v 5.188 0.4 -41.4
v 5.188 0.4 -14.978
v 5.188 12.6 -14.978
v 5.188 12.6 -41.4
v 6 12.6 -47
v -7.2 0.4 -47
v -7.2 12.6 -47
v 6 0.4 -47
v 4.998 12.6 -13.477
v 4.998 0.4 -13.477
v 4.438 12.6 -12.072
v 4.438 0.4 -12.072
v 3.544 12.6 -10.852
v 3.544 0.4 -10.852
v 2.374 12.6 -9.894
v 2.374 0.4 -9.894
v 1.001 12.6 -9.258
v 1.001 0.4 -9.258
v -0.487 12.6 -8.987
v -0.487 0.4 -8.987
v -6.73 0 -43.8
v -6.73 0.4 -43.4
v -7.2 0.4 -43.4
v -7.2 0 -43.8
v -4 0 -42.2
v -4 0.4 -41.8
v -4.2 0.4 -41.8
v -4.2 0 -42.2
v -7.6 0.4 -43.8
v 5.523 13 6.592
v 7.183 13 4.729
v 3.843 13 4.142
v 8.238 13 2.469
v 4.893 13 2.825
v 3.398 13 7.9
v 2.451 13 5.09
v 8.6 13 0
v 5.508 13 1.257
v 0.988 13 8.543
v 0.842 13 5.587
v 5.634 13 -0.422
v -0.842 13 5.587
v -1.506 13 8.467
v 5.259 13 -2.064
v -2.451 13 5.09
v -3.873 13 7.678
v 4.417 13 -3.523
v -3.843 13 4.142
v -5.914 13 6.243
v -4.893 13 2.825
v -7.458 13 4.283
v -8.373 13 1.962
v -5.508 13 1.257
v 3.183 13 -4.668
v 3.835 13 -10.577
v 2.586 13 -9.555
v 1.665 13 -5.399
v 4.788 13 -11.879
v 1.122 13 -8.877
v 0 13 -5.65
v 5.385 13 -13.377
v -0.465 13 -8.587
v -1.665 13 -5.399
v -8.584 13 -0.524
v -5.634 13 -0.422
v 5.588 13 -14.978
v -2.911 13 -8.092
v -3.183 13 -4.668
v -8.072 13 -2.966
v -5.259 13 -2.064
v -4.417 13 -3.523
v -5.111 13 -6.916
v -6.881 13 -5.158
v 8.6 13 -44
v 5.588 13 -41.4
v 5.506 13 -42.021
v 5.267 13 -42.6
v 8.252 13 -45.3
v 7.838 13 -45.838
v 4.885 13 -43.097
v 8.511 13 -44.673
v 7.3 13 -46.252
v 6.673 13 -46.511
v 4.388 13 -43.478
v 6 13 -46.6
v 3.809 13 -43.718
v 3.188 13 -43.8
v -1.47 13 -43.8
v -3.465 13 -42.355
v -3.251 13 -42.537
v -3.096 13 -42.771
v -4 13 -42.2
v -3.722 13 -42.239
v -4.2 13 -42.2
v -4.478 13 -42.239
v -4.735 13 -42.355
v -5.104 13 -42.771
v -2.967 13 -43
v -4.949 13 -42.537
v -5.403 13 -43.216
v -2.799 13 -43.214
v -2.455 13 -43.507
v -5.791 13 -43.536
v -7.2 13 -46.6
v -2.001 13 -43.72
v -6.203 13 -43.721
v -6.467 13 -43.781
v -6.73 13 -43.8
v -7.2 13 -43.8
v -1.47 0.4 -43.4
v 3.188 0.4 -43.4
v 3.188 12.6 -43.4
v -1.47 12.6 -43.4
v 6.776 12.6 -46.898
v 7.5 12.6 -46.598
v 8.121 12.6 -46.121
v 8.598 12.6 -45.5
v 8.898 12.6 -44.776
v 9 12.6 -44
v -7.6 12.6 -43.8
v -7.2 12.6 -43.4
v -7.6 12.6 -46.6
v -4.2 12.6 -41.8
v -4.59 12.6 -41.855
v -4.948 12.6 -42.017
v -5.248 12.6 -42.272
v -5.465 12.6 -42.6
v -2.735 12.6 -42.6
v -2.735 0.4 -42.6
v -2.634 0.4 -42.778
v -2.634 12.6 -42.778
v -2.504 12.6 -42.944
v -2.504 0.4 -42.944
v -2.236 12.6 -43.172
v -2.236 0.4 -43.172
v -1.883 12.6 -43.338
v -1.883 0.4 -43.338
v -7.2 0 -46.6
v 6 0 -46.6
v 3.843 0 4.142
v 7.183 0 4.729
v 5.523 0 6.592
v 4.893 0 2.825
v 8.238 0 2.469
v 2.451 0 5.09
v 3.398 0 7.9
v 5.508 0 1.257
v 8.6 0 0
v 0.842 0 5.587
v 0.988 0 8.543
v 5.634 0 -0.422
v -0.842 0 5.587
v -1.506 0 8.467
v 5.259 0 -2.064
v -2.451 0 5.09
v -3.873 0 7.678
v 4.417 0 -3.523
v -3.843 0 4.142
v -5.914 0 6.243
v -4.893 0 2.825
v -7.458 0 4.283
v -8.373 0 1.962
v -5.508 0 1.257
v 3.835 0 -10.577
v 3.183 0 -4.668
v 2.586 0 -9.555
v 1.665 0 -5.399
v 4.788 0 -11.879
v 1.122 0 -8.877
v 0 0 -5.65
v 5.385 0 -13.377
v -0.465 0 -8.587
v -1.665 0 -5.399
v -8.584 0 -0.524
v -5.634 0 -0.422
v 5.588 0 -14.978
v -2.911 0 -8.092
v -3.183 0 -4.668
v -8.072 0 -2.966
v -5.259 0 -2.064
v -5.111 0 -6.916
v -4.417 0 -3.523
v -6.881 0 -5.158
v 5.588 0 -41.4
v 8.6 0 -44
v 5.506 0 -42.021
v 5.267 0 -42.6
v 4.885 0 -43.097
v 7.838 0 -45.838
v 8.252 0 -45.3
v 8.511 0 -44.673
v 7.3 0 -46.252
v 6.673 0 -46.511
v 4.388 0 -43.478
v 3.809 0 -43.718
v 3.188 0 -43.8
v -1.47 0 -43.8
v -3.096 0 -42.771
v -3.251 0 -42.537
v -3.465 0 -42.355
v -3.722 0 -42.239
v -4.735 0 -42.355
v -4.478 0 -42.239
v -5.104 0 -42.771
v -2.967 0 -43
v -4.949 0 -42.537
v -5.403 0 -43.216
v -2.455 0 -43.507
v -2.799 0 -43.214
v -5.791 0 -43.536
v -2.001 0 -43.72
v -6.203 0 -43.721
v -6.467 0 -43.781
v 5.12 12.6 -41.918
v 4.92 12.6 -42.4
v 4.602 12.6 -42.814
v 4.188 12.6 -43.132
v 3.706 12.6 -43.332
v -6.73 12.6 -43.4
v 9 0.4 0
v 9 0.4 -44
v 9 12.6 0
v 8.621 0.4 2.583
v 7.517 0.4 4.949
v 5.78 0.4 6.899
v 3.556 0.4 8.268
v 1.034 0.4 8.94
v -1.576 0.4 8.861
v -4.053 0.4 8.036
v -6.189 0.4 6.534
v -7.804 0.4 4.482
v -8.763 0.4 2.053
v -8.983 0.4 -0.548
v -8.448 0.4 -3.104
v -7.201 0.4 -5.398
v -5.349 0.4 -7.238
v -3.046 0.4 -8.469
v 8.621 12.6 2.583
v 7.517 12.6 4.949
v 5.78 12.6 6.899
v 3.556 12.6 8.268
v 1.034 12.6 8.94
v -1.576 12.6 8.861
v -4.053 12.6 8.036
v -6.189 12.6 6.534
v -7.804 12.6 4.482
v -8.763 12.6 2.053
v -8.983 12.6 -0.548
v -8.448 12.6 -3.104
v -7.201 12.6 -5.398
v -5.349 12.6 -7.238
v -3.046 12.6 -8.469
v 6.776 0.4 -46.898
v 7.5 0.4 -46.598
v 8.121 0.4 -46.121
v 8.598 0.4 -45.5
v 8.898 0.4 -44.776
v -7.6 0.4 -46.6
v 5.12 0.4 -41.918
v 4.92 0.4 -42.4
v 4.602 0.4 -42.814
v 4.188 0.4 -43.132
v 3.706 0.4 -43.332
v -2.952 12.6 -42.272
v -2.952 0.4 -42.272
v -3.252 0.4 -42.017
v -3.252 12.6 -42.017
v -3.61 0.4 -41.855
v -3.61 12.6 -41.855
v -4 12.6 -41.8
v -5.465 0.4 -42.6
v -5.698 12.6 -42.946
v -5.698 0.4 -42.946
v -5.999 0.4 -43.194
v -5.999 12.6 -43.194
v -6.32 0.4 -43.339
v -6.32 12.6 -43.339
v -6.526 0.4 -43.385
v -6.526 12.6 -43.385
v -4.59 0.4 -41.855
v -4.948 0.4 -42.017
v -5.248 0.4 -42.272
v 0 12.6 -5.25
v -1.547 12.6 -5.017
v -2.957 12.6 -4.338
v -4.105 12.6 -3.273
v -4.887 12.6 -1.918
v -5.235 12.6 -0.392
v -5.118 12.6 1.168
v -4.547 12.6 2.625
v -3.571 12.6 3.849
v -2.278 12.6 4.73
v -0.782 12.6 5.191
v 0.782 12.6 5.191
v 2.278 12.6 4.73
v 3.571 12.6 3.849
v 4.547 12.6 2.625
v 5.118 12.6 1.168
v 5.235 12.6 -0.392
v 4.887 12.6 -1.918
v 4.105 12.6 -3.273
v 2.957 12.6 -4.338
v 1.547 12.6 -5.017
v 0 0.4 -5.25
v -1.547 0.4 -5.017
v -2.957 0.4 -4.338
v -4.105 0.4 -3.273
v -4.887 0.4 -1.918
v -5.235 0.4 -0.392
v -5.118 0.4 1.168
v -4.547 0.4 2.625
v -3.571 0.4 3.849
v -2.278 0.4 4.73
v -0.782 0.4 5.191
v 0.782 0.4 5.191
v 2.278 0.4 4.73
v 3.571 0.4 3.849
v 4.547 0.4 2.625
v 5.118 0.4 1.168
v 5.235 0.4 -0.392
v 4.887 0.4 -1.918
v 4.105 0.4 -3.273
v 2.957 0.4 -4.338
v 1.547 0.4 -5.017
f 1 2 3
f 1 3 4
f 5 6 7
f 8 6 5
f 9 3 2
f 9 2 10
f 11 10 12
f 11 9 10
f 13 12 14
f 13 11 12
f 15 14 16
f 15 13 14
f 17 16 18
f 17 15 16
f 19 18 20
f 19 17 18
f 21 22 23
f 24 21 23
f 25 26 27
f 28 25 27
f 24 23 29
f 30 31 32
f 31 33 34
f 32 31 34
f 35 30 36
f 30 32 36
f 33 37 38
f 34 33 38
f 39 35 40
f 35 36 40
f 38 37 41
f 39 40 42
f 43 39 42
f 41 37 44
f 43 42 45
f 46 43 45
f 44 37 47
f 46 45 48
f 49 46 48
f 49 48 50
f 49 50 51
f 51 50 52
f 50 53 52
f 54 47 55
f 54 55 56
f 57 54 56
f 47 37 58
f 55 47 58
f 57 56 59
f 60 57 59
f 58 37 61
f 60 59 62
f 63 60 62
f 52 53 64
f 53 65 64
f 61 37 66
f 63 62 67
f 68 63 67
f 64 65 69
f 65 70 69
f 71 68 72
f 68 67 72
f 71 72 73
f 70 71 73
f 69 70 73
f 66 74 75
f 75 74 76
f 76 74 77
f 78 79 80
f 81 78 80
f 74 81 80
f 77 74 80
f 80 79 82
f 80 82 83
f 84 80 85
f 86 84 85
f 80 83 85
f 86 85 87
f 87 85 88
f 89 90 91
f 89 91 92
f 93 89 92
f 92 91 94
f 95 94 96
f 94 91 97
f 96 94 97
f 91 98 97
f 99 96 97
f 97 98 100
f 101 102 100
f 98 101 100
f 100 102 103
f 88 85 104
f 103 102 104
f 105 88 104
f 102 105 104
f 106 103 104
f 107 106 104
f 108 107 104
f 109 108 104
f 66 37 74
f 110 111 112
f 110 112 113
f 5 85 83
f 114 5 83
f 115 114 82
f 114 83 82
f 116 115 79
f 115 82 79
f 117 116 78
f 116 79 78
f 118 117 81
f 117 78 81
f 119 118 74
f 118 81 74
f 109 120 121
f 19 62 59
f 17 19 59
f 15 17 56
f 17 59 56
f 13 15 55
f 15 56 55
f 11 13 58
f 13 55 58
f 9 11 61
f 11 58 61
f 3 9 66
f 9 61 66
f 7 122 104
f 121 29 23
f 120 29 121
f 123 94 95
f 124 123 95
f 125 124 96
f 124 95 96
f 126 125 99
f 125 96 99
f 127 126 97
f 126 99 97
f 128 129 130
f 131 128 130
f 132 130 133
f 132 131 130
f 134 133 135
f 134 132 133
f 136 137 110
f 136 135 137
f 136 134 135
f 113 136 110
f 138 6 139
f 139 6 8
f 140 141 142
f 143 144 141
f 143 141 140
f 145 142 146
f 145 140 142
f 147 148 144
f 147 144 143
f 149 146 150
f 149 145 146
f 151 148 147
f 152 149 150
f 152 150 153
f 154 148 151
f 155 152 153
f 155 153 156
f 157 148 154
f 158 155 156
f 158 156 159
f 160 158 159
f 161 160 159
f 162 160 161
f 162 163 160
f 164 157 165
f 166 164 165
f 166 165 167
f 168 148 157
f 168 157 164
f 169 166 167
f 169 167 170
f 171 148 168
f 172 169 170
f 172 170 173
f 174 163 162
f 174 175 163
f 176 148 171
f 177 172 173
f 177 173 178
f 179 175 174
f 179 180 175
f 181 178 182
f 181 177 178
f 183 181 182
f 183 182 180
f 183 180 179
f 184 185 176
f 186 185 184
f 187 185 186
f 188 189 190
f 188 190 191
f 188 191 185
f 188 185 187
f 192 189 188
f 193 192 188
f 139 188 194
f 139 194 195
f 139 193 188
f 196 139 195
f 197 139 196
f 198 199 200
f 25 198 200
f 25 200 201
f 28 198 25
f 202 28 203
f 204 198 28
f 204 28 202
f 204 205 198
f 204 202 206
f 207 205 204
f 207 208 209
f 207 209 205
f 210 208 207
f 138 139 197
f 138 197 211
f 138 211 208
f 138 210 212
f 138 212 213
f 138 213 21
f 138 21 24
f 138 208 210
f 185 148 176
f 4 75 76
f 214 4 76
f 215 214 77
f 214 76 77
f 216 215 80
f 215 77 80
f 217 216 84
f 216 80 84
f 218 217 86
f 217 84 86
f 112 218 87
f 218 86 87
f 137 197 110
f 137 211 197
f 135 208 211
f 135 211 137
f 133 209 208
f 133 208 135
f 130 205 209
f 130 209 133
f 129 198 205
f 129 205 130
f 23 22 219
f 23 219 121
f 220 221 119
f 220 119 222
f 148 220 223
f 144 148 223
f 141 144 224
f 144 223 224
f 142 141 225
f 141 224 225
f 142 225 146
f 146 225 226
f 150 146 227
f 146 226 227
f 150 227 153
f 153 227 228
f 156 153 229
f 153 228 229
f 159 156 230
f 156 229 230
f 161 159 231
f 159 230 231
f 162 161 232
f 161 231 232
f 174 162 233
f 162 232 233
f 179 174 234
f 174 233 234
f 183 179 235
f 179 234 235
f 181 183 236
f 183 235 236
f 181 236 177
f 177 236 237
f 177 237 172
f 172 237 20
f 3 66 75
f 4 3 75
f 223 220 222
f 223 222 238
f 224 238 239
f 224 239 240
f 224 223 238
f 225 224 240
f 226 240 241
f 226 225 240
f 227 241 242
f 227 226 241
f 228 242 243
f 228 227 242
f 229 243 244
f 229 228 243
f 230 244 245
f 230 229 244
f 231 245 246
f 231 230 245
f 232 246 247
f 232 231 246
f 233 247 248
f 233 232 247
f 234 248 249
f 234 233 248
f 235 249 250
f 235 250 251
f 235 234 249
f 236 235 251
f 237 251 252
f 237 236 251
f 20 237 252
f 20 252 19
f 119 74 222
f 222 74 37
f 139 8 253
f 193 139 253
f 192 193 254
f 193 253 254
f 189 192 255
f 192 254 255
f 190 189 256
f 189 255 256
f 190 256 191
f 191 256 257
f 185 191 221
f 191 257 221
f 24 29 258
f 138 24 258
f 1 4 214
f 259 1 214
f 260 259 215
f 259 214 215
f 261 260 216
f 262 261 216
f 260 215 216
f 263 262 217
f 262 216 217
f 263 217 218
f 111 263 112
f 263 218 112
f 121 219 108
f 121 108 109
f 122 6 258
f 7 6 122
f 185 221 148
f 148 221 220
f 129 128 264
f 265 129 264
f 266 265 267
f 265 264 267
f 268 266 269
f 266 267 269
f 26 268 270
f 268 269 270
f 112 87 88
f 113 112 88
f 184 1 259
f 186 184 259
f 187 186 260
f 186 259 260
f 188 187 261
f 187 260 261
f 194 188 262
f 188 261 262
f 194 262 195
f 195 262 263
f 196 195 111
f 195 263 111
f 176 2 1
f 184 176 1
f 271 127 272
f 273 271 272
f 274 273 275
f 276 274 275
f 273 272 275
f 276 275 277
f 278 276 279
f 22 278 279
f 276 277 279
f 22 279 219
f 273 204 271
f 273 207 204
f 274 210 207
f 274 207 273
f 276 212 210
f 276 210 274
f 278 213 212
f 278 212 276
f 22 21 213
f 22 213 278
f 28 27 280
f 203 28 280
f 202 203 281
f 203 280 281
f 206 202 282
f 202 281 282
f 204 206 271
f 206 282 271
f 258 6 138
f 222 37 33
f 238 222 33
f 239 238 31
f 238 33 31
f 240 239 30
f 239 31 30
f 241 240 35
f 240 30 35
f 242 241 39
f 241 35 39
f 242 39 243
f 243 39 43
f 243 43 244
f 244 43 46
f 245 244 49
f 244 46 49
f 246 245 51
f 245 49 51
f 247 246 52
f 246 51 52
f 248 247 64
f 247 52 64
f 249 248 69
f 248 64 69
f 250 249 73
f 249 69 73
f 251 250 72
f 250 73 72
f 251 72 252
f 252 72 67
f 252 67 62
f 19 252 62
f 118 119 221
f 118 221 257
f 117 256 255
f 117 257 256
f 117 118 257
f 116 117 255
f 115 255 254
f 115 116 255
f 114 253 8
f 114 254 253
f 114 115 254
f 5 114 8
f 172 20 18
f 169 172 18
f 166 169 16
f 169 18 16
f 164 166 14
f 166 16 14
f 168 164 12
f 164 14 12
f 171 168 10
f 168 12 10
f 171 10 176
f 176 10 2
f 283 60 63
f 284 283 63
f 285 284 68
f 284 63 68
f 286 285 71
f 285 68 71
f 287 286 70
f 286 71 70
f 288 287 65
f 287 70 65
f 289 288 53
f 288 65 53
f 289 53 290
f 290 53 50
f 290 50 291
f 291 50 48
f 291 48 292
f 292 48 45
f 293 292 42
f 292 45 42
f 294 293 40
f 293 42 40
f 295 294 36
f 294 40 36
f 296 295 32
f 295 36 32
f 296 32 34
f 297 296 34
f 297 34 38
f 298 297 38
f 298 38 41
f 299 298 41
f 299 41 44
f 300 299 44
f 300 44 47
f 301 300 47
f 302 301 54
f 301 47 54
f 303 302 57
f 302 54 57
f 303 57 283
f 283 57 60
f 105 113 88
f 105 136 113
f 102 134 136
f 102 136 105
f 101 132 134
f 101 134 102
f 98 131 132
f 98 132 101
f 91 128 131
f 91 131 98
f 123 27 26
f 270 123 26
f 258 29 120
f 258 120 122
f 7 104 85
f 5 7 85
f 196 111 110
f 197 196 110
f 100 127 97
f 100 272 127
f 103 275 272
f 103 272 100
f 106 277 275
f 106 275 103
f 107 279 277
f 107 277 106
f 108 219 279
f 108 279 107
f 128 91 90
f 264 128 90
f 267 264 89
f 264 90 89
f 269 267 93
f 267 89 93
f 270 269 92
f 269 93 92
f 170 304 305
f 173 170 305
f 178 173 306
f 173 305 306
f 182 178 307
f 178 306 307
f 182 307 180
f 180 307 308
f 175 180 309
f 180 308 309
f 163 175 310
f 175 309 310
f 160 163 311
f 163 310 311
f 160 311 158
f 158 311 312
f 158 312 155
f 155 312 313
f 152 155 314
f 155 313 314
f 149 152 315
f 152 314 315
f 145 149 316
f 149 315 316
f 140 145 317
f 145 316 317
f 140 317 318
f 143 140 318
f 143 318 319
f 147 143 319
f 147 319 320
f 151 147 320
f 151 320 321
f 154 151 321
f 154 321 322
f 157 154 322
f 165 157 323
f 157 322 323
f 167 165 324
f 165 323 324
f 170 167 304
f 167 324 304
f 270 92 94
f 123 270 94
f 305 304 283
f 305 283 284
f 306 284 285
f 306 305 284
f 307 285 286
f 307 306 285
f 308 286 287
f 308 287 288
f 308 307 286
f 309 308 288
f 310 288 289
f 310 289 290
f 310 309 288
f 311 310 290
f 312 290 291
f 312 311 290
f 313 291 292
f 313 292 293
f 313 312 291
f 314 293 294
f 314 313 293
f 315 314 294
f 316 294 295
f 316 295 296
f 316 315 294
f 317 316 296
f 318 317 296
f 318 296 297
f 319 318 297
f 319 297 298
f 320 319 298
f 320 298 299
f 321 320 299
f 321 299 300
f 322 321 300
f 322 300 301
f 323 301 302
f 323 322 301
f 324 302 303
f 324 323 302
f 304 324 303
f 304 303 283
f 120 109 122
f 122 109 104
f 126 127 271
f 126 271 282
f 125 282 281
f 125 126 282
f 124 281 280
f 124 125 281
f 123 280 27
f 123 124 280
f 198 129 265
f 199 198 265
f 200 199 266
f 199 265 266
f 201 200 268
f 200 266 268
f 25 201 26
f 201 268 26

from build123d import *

# Parameters (mm, degrees)
SKETCH_1_R      = 5.25
EXTRUDE_1_DEPTH = 13
FILLET_1_R      = 6
FILLET_2_R      = 2
FILLET_3_R      = 3
SKETCH_2_W      = 3
SKETCH_2_H      = 13
EXTRUDE_2_DEPTH = 1.6
FILLET_4_R      = 1.4
FILLET_5_R      = 1.4
CHAMFER_1_SIZE  = 0.4


with BuildPart() as part:
    # 草图1 → 凸台-拉伸1 (new body)
    with BuildSketch(Plane(origin=(0, 0, 0), x_dir=(1, 0, 0), z_dir=(0, 1, 0))):
        with BuildLine():
            Line((5.188235294, 7.354061091), (5.188235294, 43.4))
            Line((5.188235294, 43.4), (-7.6, 43.4))
            Line((-7.6, 43.4), (-7.6, 47))
            Line((-7.6, 47), (5.4, 47))
            Line((5.4, 47), (9, 47))
            Line((9, 47), (9, 0))
            ThreePointArc((9, 0), (-7.990435459, -4.14161094), (5.188235294, 7.354061091))
        make_face()
        with Locations(Location((0, 0, 0), (0, 0, 90))):
            Circle(SKETCH_1_R, mode=Mode.SUBTRACT)
    extrude(amount=EXTRUDE_1_DEPTH)

    # 圆角1
    fillet_1_edges = [part.edges().sort_by_distance(p)[0] for p in [
        (5.188235294, 6.5, -7.354061091),
    ]]
    fillet(fillet_1_edges, radius=FILLET_1_R)

    # 圆角2
    fillet_2_edges = [part.edges().sort_by_distance(p)[0] for p in [
        (5.188235294, 6.5, -43.4),
    ]]
    fillet(fillet_2_edges, radius=FILLET_2_R)

    # 圆角3
    fillet_3_edges = [part.edges().sort_by_distance(p)[0] for p in [
        (9, 6.5, -47),
    ]]
    fillet(fillet_3_edges, radius=FILLET_3_R)

    # 草图2 → 凸台-拉伸2 (add)
    with BuildSketch(Plane.XY.offset(-43.4)):
        with Locations((-4.1, 6.5)):
            Rectangle(SKETCH_2_W, SKETCH_2_H)
    extrude(amount=EXTRUDE_2_DEPTH)

    # 圆角4
    fillet_4_edges = [part.edges().sort_by_distance(p)[0] for p in [
        (-5.6, 6.5, -41.8),
        (-2.6, 6.5, -41.8),
    ]]
    fillet(fillet_4_edges, radius=FILLET_4_R)

    # 圆角5
    fillet_5_edges = [part.edges().sort_by_distance(p)[0] for p in [
        (-2.6, 6.5, -43.4),
        (-5.6, 6.5, -43.4),
    ]]
    fillet(fillet_5_edges, radius=FILLET_5_R)

    # 倒角1
    chamfer_1_edges = [part.edges().sort_by_distance(p)[0] for p in [
        (-7.6, 6.5, -43.4),
        (-7.6, 6.5, -47),
        (0, 0, 5.25),
        (0, 13, 5.25),
        (-7.6, 13, -45.2),
        (-7.164911064, 13, -43.4),
        (-6.189364692, 0, 6.533893533),
        (-6.189364692, 13, 6.533893533),
        (3.544164316, 0, -10.851775368),
        (3.544164316, 13, -10.851775368),
        (5.188235294, 0, -28.189009248),
        (5.188235294, 13, -28.189009248),
        (4.602448856, 0, -42.814213562),
        (4.602448856, 13, -42.814213562),
        (-0.8, 0, -47),
        (-0.8, 13, -47),
        (8.121320344, 0, -46.121320344),
        (8.121320344, 13, -46.121320344),
        (-4.1, 0, -41.8),
        (-4.1, 13, -41.8),
        (-3.251668523, 13, -42.016784043),
        (-4.948331477, 0, -42.016784043),
        (-3.251668523, 0, -42.016784043),
        (0.859028711, 0, -43.4),
        (0.859028711, 13, -43.4),
        (-4.948331477, 13, -42.016784043),
        (-2.218509349, 13, -43.183215957),
        (-2.218509349, 0, -43.183215957),
        (-5.981490651, 0, -43.183215957),
        (-5.981490651, 13, -43.183215957),
        (-7.164911064, 0, -43.4),
        (-7.6, 0, -45.2),
        (9, 13, -22),
        (9, 0, -22),
    ]]
    chamfer(chamfer_1_edges, length=CHAMFER_1_SIZE)


solid = part.part
